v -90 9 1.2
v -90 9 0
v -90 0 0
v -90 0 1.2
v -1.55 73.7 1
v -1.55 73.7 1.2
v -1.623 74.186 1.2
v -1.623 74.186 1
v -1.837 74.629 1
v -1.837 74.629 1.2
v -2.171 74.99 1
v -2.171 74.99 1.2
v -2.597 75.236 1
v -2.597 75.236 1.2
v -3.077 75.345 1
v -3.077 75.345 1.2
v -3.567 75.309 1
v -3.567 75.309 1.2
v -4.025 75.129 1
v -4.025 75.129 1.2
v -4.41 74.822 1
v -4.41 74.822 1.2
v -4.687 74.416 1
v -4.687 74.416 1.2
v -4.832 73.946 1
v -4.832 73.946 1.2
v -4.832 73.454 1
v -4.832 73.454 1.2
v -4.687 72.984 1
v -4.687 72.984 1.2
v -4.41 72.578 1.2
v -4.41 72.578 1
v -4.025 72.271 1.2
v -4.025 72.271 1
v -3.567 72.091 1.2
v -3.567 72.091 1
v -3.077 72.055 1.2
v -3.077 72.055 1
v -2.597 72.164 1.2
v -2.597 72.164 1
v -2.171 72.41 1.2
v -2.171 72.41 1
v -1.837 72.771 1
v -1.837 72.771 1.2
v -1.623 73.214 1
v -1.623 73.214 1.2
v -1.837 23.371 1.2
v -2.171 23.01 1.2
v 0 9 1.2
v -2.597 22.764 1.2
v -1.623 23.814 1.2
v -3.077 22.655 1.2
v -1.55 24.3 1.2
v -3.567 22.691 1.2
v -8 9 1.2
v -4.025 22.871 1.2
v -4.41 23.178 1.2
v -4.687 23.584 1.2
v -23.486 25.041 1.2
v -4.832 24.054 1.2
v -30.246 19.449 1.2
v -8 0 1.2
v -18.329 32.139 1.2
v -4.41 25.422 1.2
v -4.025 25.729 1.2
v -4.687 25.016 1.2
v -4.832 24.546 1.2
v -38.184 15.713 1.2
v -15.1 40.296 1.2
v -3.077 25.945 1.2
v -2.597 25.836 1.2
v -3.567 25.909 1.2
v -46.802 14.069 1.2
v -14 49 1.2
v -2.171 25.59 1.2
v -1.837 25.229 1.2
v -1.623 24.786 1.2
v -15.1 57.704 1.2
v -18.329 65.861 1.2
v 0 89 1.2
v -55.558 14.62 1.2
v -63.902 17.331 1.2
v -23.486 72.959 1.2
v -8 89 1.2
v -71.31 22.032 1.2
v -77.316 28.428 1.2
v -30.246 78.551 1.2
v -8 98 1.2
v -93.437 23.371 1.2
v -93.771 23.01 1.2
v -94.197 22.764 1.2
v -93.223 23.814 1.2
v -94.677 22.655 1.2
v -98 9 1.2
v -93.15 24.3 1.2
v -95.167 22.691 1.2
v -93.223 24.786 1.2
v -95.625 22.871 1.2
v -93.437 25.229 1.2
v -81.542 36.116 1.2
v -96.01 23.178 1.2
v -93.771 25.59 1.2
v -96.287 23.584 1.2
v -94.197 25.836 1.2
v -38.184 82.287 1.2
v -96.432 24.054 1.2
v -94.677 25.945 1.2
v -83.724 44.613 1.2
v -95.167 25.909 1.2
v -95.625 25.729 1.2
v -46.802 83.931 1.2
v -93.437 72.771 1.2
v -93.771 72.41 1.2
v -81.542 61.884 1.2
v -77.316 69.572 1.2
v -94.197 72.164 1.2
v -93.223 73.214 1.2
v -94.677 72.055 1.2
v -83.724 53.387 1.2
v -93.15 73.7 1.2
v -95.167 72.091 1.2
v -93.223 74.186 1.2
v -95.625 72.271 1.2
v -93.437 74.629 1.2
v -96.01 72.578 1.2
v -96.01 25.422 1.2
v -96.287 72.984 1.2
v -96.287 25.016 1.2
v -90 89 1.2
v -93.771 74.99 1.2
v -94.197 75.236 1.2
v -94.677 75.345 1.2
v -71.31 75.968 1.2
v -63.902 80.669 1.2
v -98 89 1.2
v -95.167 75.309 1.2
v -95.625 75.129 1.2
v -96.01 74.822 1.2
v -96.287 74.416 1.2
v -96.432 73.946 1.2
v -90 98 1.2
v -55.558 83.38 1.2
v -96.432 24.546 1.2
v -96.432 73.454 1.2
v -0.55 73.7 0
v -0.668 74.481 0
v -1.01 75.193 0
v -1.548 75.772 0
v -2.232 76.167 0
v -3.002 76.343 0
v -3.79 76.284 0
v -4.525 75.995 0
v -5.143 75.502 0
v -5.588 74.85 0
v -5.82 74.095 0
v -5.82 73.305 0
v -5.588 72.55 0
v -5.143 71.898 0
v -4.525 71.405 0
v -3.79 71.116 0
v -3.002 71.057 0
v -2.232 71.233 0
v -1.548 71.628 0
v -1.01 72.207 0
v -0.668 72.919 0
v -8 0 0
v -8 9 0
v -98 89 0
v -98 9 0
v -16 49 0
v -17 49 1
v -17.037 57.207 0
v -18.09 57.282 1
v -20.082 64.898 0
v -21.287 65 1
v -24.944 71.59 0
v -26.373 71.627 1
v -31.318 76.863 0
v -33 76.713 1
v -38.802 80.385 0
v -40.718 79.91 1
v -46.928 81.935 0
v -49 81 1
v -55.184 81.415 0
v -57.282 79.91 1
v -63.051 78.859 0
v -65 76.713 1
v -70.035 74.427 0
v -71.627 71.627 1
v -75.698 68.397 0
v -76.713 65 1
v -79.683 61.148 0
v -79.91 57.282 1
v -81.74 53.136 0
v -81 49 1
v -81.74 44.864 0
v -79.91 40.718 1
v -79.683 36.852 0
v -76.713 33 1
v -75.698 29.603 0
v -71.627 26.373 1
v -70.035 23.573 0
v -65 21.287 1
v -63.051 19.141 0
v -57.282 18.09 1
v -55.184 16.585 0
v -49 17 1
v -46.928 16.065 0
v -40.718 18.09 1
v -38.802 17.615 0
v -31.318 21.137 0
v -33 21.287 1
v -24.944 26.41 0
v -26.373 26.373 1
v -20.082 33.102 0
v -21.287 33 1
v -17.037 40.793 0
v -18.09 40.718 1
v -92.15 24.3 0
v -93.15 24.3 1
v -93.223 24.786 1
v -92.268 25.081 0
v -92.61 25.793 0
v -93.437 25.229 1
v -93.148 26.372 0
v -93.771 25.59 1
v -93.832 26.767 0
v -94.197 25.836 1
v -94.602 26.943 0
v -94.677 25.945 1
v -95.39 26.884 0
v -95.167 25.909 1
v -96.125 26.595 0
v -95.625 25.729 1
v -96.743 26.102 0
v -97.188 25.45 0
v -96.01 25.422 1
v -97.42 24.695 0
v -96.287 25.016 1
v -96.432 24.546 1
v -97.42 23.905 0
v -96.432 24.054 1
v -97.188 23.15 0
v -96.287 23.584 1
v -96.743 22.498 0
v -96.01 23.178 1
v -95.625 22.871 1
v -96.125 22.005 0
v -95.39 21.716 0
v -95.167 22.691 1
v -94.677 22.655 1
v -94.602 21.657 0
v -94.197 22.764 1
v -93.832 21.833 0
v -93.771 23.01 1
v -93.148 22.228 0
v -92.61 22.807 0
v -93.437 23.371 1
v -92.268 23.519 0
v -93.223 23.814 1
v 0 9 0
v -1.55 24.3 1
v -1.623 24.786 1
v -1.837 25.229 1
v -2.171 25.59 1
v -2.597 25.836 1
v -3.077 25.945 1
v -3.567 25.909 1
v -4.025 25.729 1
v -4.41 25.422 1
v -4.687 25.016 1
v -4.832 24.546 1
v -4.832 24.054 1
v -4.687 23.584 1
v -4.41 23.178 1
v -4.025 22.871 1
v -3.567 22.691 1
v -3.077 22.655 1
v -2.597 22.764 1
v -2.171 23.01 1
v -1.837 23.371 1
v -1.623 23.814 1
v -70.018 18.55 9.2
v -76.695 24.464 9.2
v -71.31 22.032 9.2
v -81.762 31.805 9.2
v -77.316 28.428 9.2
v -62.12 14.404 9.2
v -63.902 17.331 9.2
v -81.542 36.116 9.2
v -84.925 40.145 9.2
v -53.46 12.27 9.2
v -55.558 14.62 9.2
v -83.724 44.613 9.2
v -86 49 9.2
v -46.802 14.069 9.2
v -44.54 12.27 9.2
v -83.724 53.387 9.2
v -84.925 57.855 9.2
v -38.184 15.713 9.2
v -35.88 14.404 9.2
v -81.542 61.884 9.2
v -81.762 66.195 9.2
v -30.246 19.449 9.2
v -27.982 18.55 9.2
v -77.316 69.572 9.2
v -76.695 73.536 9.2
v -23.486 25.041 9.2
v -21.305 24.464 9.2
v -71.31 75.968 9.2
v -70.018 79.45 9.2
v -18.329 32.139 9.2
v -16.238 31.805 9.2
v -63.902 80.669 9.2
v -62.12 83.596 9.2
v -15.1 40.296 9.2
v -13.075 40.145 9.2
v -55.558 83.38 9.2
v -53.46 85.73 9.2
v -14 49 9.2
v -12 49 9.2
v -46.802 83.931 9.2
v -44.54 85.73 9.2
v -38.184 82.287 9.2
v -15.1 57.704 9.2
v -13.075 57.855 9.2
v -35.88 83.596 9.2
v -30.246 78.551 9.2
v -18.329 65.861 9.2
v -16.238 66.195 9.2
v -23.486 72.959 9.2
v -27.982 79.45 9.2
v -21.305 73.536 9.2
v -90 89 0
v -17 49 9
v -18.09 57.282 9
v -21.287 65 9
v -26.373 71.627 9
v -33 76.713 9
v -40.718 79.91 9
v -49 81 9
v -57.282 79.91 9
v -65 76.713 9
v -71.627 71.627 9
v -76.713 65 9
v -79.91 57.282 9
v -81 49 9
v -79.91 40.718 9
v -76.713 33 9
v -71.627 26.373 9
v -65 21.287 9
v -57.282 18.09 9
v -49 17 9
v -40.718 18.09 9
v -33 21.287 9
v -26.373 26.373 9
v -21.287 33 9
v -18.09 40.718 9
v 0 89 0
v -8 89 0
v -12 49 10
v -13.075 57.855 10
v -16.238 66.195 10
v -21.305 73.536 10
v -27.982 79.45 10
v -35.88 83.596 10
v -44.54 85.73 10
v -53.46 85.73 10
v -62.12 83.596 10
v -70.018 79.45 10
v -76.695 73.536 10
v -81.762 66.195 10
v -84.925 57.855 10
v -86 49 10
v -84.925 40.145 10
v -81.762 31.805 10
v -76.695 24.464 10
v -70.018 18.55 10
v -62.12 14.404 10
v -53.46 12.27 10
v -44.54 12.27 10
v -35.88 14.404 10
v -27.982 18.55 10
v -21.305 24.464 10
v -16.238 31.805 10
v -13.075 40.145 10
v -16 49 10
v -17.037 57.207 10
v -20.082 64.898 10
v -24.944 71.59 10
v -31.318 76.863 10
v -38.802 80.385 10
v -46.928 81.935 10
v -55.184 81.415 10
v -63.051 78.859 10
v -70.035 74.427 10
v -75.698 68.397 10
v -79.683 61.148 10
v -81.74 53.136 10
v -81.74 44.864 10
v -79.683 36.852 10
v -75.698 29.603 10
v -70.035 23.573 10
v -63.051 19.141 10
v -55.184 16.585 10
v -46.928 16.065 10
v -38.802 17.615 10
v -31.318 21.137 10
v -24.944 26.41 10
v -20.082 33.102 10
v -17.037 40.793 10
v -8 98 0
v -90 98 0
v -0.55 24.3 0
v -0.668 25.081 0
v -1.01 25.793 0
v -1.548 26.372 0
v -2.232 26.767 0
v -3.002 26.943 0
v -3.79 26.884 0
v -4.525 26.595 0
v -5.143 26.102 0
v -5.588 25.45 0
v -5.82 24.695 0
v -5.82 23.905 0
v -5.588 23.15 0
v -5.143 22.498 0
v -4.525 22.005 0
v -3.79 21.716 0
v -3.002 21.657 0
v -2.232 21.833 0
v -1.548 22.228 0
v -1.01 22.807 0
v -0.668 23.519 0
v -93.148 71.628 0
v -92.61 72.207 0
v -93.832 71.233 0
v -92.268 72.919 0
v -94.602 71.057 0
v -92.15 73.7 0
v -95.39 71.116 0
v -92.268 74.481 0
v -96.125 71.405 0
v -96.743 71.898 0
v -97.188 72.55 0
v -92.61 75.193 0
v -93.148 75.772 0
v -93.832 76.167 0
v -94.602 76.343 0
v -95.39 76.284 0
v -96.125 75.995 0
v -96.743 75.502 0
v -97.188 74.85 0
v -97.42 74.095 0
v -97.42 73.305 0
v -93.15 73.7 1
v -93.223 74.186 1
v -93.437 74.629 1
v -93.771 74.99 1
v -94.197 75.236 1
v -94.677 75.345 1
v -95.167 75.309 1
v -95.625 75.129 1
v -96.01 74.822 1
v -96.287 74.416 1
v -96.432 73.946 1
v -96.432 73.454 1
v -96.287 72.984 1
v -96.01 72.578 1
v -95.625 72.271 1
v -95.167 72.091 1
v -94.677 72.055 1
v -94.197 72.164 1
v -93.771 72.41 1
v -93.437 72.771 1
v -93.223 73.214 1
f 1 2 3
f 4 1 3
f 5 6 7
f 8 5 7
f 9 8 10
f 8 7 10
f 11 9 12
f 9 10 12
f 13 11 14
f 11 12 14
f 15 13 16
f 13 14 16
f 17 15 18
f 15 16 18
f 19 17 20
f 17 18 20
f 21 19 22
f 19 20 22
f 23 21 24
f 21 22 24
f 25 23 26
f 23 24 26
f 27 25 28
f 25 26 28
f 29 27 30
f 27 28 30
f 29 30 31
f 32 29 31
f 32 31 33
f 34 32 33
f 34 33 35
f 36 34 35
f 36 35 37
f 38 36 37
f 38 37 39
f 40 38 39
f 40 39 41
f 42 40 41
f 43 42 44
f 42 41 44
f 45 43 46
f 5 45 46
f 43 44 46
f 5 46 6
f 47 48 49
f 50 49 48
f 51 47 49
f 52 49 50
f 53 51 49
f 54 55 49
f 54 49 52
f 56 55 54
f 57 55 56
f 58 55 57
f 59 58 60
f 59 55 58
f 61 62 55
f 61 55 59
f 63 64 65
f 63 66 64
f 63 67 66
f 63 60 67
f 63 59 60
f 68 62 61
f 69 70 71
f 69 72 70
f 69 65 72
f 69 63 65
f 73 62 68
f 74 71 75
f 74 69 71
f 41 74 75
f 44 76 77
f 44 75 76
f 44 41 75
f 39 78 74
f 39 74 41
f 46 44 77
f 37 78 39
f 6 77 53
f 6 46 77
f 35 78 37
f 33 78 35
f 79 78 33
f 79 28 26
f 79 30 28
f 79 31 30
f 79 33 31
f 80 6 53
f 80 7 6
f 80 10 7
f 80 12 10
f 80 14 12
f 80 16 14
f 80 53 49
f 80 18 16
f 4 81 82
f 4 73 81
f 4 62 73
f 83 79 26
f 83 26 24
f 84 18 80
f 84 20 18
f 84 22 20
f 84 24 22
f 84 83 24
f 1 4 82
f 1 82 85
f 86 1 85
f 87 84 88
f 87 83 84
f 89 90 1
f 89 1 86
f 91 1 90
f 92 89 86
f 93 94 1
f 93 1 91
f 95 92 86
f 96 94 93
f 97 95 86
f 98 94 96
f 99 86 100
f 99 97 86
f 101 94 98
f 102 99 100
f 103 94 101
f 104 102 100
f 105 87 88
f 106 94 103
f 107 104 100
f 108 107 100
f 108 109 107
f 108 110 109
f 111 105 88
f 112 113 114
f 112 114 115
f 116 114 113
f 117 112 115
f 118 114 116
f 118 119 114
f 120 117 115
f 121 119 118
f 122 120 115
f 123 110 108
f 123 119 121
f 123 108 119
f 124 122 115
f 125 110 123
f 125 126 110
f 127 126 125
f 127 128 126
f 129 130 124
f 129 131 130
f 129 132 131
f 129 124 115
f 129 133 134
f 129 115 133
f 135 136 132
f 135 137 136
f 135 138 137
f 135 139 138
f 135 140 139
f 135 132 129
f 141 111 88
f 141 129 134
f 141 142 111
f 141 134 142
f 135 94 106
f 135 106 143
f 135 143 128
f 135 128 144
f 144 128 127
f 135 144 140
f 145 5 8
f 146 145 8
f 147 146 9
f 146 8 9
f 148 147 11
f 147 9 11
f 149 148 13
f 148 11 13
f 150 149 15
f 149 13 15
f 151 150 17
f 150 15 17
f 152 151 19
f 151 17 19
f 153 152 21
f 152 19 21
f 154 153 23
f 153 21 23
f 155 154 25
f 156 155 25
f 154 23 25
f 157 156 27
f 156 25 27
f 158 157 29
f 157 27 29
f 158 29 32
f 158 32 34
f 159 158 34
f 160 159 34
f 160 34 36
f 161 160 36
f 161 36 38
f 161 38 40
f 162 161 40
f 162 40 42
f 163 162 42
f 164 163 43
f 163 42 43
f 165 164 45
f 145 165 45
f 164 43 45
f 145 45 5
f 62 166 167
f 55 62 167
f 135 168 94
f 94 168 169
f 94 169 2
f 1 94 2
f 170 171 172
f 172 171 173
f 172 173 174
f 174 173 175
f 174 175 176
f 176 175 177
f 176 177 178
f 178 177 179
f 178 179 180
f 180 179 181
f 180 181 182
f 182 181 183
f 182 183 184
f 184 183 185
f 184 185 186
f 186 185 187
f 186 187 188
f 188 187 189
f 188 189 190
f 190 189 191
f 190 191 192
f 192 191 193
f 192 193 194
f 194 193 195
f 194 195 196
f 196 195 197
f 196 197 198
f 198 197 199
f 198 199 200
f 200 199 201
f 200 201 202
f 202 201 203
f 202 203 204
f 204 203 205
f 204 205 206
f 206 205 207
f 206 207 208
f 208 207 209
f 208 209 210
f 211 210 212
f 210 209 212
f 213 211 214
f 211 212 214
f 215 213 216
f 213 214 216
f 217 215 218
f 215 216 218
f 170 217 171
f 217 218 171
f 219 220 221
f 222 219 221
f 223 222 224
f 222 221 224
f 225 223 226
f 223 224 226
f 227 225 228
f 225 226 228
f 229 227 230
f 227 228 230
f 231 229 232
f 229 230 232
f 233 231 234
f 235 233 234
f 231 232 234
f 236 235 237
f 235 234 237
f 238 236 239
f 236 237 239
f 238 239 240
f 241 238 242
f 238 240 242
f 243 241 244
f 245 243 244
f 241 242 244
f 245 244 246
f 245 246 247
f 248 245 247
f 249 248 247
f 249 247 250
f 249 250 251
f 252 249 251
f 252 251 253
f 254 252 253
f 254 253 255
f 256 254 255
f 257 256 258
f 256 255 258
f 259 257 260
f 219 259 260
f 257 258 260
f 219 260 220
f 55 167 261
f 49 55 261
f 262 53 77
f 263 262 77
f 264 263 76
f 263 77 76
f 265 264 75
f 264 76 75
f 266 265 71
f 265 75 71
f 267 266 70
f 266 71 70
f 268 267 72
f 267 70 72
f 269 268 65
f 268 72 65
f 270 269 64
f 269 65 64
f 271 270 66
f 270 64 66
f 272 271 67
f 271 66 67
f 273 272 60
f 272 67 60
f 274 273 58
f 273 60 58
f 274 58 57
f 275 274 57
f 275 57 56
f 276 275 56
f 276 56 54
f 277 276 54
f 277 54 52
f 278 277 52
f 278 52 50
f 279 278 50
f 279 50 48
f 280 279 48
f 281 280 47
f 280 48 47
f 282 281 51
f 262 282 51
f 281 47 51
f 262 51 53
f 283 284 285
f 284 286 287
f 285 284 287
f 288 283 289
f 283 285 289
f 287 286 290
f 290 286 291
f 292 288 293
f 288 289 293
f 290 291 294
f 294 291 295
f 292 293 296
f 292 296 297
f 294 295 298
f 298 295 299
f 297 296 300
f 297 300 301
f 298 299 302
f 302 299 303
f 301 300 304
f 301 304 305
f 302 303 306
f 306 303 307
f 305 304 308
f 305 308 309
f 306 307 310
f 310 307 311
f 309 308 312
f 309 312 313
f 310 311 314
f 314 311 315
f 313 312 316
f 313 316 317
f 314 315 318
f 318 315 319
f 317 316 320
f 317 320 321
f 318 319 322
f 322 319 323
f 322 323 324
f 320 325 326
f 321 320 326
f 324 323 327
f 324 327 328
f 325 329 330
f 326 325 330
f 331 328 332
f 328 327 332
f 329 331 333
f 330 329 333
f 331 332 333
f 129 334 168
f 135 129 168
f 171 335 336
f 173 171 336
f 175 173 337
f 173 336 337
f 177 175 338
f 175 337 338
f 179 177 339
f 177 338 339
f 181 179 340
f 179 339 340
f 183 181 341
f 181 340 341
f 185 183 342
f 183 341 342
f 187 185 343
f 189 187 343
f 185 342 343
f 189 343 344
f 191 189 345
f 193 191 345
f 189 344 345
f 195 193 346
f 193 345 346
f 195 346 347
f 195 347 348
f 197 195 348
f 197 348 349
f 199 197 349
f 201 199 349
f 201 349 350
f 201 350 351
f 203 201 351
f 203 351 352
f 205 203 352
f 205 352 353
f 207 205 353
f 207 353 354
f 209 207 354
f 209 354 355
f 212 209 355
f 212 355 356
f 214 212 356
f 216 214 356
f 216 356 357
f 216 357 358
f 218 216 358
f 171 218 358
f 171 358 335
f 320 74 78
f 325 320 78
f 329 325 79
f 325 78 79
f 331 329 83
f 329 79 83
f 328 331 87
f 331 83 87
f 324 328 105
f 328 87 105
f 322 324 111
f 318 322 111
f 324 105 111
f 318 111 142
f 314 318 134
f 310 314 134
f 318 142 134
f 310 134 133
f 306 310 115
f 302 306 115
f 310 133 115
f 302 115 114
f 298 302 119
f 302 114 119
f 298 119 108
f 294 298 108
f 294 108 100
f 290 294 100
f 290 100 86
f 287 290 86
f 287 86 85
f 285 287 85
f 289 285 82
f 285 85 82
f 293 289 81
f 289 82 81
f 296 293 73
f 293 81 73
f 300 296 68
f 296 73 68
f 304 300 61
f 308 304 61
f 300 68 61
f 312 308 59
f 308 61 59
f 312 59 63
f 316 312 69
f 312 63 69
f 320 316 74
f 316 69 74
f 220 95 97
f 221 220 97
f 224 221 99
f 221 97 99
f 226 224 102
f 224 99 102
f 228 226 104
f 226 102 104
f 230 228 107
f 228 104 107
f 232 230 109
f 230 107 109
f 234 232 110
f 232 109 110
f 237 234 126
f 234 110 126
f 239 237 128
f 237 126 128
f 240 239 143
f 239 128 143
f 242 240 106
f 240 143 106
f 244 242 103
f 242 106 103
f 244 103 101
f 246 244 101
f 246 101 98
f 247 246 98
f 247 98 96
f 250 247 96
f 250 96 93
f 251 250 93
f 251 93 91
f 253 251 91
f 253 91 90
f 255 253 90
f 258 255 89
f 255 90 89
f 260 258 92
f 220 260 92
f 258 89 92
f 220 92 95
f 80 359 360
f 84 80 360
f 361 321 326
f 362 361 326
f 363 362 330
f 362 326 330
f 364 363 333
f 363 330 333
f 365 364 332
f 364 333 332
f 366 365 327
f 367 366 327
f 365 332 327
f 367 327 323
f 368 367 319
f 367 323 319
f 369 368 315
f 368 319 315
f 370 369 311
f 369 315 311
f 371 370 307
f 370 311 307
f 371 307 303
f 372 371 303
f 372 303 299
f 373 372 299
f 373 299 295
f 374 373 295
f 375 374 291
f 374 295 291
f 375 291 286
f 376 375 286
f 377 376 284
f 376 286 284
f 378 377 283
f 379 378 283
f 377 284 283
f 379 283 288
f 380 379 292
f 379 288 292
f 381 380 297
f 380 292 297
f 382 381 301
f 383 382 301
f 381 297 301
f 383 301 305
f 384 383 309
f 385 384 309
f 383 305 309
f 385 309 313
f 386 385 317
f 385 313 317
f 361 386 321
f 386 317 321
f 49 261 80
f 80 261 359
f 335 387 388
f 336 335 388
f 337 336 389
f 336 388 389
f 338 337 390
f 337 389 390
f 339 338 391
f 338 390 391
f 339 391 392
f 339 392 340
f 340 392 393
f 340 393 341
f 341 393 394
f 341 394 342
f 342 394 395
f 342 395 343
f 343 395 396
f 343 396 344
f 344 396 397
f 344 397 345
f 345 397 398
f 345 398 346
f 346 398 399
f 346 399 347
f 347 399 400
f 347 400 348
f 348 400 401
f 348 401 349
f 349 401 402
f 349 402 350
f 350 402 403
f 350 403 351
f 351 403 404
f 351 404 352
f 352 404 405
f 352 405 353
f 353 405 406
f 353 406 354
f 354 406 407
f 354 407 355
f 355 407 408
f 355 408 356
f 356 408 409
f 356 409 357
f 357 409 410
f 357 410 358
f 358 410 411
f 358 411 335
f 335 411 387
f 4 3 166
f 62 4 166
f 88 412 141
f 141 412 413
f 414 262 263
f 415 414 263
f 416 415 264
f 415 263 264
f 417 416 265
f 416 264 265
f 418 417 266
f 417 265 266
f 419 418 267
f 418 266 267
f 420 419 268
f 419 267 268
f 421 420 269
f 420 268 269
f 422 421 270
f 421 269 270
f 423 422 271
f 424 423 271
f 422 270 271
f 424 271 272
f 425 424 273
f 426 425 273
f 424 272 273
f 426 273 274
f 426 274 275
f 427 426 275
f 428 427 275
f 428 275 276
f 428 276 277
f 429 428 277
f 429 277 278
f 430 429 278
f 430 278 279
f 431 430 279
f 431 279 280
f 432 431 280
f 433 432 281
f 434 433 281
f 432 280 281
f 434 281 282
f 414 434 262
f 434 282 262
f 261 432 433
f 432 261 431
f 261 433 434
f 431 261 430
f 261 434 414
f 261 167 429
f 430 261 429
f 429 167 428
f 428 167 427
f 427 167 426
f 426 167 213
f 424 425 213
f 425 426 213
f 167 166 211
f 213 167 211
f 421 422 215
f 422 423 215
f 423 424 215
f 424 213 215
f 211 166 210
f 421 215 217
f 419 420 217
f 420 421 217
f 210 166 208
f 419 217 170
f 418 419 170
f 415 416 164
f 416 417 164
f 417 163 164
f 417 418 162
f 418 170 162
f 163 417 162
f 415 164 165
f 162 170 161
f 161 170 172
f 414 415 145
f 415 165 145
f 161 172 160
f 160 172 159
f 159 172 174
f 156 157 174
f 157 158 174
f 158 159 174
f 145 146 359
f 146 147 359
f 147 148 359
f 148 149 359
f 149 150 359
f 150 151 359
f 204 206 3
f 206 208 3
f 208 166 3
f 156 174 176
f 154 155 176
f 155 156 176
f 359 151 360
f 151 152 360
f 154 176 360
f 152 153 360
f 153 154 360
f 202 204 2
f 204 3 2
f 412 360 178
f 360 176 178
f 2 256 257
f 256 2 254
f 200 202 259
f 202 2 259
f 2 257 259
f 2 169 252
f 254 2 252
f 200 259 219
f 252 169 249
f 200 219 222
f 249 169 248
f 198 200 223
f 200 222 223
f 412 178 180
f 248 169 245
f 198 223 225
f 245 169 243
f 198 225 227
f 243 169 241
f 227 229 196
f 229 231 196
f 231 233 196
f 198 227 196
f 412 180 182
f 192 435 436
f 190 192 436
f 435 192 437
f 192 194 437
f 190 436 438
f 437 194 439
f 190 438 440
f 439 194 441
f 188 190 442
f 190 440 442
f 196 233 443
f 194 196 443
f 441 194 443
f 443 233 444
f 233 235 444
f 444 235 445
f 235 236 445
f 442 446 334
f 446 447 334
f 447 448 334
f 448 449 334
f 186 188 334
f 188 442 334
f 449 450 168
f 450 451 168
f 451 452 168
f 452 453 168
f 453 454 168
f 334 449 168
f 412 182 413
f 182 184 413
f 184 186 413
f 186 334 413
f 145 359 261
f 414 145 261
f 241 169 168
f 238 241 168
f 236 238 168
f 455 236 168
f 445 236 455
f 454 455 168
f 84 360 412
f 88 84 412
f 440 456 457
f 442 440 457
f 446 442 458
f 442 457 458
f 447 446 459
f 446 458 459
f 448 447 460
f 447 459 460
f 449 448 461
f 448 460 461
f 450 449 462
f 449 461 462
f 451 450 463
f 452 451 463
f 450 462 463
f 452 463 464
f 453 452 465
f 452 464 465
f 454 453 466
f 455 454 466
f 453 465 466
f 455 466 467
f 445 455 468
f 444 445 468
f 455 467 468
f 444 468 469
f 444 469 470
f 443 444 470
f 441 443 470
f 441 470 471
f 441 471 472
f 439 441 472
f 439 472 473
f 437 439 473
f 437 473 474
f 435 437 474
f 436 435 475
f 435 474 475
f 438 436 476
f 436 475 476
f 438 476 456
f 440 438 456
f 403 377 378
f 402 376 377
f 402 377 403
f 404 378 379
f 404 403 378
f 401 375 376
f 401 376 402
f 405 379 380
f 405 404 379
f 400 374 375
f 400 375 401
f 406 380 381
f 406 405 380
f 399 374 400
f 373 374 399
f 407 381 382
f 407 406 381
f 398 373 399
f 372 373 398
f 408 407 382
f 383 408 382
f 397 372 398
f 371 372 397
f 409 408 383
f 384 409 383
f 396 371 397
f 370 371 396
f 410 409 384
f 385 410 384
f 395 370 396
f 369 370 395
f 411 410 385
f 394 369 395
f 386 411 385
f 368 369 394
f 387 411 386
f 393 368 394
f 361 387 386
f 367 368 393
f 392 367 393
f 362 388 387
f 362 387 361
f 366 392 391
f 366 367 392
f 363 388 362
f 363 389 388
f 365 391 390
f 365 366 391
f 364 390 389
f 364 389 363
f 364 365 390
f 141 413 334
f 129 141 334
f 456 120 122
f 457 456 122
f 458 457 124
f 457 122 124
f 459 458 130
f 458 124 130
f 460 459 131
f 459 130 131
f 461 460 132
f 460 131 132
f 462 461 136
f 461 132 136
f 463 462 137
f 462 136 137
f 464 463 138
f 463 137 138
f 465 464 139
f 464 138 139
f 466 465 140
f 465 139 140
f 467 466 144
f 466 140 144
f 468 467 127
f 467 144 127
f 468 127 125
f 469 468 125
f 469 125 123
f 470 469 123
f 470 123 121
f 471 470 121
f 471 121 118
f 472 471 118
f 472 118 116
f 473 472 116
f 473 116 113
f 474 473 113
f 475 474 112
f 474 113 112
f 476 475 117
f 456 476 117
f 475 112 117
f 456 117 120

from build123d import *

# Parameters (mm, degrees)
BOSS_EXTRUDE1_DEPTH = 1.2
SKETCH2_R           = 1.65
CUT_EXTRUDE1_DEPTH  = 1.2
SKETCH3_R           = 35
BOSS_EXTRUDE2_DEPTH = 8
SKETCH5_R           = 37
BOSS_EXTRUDE3_DEPTH = 0.8
SKETCH6_R           = 32
CUT_EXTRUDE2_DEPTH  = 139.953229541
CHAMFER1_SIZE       = 1
CHAMFER2_SIZE       = 1


with BuildPart() as part:
    # Sketch1 → Boss-Extrude1 (new body)
    with BuildSketch(Plane(origin=(0, 0, 0), x_dir=(0, 1, 0), z_dir=(0, 0, 1))):
        Polygon((0, 8), (9, 8), (9, 0), (89, 0), (89, 8), (98, 8), (98, 90), (89, 90), (89, 98), (9, 98), (9, 90), (0, 90), align=None)
    extrude(amount=BOSS_EXTRUDE1_DEPTH)

    # Sketch2 → Cut-Extrude1 (cut)
    with BuildSketch(Plane.XY.offset(1.2)):
        with Locations((-94.8, 73.7)):
            Circle(SKETCH2_R)
        with Locations((-94.8, 24.3)):
            Circle(SKETCH2_R)
        with Locations((-3.2, 24.3)):
            Circle(SKETCH2_R)
        with Locations((-3.2, 73.7)):
            Circle(SKETCH2_R)
    extrude(amount=-CUT_EXTRUDE1_DEPTH, mode=Mode.SUBTRACT)

    # Sketch3 → Boss-Extrude2 (add)
    with BuildSketch(Plane.XY.offset(1.2)):
        with Locations((-49, 49)):
            Circle(SKETCH3_R)
    extrude(amount=BOSS_EXTRUDE2_DEPTH)

    # Sketch5 → Boss-Extrude3 (add)
    with BuildSketch(Plane.XY.offset(9.2)):
        with Locations((-49, 49)):
            Circle(SKETCH5_R)
    extrude(amount=BOSS_EXTRUDE3_DEPTH)

    # Sketch6 → Cut-Extrude2 (cut, through all)
    with BuildSketch(Plane.XY.offset(10)):
        with Locations((-49, 49)):
            Circle(SKETCH6_R)
    extrude(amount=-CUT_EXTRUDE2_DEPTH, mode=Mode.SUBTRACT)

    # Chamfer1
    chamfer1_edges = [part.edges().sort_by_distance(p)[0] for p in [
        (-4.85, 73.7, 0),
        (-4.85, 24.3, 0),
        (-96.45, 24.3, 0),
        (-96.45, 73.7, 0),
    ]]
    chamfer(chamfer1_edges, length=CHAMFER1_SIZE)

    # Chamfer2
    chamfer2_edges = [part.edges().sort_by_distance(p)[0] for p in [
        (-81, 49, 0),
        (-81, 49, 10),
    ]]
    chamfer(chamfer2_edges, length=CHAMFER2_SIZE)


solid = part.part
